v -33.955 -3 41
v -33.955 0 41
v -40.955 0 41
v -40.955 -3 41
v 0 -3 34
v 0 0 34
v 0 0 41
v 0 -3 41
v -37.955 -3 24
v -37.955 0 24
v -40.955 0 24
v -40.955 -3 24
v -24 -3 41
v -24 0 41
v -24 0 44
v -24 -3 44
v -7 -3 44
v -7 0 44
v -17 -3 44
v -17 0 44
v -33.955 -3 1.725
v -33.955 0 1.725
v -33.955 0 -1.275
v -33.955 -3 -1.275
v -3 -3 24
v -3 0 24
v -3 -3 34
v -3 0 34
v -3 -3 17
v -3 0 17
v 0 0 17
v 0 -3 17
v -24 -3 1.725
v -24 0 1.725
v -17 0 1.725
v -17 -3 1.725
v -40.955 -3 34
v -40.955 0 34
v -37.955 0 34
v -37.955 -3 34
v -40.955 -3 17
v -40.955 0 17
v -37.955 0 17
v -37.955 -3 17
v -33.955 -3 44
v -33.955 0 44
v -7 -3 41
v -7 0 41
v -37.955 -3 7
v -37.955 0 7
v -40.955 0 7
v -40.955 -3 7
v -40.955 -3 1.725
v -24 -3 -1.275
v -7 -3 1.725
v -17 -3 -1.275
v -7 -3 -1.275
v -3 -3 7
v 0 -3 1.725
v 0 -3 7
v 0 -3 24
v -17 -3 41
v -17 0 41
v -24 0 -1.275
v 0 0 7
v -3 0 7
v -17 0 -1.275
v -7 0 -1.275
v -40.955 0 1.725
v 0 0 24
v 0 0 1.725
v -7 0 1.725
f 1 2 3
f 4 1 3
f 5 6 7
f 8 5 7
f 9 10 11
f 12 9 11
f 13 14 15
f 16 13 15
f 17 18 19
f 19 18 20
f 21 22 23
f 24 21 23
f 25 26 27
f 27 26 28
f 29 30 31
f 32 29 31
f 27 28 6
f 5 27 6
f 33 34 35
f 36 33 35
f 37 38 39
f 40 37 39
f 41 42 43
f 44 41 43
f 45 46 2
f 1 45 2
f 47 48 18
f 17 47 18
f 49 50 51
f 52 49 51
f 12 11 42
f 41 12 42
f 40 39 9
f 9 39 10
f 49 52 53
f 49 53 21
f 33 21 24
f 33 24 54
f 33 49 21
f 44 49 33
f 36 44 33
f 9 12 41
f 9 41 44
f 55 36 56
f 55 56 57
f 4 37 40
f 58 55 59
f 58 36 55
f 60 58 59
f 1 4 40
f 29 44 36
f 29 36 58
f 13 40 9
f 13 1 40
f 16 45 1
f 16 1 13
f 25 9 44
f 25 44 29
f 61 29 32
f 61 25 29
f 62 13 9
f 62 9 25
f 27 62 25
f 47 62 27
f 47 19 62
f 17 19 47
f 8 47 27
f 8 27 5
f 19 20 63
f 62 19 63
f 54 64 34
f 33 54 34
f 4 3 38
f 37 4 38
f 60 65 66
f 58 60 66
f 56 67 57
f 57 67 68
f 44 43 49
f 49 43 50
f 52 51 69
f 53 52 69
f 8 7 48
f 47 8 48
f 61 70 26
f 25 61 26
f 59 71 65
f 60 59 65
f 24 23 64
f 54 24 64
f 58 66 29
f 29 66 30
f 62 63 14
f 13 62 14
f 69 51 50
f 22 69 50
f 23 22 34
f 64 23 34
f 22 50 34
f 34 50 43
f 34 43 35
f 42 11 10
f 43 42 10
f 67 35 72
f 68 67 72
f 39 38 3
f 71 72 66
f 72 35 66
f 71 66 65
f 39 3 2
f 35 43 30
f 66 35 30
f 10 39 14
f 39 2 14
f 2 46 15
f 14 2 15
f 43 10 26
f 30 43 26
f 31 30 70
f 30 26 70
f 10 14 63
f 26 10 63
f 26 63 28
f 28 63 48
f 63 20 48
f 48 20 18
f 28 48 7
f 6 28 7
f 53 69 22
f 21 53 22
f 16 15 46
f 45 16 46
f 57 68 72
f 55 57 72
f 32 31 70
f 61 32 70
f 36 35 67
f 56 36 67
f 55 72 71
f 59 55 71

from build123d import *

# Parameters (mm, degrees)
F1_DEPTH = 3


with BuildPart() as f1:
    # F0 (on Front) → F1 (new body)
    with BuildSketch(Plane.XZ):
        Polygon((-7, 1.724721), (0, 1.724721), (0, 7), (-3, 7), (-3, 17), (0, 17), (0, 24), (-3, 24), (-3, 34), (0, 34), (0, 41), (-7, 41), (-7, 44), (-17, 44), (-17, 41), (-24, 41), (-24, 44), (-33.955059, 44), (-33.955059, 41), (-34, 41), (-40.955059, 41), (-40.955059, 34), (-37.955059, 34), (-37.955059, 24), (-40.955059, 24), (-40.955059, 17), (-37.955059, 17), (-37.955059, 7), (-40.955059, 7), (-40.955059, 1.724721), (-34, 1.724721), (-33.955059, 1.724721), (-33.955059, -1.275279), (-24, -1.275279), (-24, 1.724721), (-17, 1.724721), (-17, -1.275279), (-7, -1.275279), align=None)
    extrude(amount=F1_DEPTH)


solid = f1.part
